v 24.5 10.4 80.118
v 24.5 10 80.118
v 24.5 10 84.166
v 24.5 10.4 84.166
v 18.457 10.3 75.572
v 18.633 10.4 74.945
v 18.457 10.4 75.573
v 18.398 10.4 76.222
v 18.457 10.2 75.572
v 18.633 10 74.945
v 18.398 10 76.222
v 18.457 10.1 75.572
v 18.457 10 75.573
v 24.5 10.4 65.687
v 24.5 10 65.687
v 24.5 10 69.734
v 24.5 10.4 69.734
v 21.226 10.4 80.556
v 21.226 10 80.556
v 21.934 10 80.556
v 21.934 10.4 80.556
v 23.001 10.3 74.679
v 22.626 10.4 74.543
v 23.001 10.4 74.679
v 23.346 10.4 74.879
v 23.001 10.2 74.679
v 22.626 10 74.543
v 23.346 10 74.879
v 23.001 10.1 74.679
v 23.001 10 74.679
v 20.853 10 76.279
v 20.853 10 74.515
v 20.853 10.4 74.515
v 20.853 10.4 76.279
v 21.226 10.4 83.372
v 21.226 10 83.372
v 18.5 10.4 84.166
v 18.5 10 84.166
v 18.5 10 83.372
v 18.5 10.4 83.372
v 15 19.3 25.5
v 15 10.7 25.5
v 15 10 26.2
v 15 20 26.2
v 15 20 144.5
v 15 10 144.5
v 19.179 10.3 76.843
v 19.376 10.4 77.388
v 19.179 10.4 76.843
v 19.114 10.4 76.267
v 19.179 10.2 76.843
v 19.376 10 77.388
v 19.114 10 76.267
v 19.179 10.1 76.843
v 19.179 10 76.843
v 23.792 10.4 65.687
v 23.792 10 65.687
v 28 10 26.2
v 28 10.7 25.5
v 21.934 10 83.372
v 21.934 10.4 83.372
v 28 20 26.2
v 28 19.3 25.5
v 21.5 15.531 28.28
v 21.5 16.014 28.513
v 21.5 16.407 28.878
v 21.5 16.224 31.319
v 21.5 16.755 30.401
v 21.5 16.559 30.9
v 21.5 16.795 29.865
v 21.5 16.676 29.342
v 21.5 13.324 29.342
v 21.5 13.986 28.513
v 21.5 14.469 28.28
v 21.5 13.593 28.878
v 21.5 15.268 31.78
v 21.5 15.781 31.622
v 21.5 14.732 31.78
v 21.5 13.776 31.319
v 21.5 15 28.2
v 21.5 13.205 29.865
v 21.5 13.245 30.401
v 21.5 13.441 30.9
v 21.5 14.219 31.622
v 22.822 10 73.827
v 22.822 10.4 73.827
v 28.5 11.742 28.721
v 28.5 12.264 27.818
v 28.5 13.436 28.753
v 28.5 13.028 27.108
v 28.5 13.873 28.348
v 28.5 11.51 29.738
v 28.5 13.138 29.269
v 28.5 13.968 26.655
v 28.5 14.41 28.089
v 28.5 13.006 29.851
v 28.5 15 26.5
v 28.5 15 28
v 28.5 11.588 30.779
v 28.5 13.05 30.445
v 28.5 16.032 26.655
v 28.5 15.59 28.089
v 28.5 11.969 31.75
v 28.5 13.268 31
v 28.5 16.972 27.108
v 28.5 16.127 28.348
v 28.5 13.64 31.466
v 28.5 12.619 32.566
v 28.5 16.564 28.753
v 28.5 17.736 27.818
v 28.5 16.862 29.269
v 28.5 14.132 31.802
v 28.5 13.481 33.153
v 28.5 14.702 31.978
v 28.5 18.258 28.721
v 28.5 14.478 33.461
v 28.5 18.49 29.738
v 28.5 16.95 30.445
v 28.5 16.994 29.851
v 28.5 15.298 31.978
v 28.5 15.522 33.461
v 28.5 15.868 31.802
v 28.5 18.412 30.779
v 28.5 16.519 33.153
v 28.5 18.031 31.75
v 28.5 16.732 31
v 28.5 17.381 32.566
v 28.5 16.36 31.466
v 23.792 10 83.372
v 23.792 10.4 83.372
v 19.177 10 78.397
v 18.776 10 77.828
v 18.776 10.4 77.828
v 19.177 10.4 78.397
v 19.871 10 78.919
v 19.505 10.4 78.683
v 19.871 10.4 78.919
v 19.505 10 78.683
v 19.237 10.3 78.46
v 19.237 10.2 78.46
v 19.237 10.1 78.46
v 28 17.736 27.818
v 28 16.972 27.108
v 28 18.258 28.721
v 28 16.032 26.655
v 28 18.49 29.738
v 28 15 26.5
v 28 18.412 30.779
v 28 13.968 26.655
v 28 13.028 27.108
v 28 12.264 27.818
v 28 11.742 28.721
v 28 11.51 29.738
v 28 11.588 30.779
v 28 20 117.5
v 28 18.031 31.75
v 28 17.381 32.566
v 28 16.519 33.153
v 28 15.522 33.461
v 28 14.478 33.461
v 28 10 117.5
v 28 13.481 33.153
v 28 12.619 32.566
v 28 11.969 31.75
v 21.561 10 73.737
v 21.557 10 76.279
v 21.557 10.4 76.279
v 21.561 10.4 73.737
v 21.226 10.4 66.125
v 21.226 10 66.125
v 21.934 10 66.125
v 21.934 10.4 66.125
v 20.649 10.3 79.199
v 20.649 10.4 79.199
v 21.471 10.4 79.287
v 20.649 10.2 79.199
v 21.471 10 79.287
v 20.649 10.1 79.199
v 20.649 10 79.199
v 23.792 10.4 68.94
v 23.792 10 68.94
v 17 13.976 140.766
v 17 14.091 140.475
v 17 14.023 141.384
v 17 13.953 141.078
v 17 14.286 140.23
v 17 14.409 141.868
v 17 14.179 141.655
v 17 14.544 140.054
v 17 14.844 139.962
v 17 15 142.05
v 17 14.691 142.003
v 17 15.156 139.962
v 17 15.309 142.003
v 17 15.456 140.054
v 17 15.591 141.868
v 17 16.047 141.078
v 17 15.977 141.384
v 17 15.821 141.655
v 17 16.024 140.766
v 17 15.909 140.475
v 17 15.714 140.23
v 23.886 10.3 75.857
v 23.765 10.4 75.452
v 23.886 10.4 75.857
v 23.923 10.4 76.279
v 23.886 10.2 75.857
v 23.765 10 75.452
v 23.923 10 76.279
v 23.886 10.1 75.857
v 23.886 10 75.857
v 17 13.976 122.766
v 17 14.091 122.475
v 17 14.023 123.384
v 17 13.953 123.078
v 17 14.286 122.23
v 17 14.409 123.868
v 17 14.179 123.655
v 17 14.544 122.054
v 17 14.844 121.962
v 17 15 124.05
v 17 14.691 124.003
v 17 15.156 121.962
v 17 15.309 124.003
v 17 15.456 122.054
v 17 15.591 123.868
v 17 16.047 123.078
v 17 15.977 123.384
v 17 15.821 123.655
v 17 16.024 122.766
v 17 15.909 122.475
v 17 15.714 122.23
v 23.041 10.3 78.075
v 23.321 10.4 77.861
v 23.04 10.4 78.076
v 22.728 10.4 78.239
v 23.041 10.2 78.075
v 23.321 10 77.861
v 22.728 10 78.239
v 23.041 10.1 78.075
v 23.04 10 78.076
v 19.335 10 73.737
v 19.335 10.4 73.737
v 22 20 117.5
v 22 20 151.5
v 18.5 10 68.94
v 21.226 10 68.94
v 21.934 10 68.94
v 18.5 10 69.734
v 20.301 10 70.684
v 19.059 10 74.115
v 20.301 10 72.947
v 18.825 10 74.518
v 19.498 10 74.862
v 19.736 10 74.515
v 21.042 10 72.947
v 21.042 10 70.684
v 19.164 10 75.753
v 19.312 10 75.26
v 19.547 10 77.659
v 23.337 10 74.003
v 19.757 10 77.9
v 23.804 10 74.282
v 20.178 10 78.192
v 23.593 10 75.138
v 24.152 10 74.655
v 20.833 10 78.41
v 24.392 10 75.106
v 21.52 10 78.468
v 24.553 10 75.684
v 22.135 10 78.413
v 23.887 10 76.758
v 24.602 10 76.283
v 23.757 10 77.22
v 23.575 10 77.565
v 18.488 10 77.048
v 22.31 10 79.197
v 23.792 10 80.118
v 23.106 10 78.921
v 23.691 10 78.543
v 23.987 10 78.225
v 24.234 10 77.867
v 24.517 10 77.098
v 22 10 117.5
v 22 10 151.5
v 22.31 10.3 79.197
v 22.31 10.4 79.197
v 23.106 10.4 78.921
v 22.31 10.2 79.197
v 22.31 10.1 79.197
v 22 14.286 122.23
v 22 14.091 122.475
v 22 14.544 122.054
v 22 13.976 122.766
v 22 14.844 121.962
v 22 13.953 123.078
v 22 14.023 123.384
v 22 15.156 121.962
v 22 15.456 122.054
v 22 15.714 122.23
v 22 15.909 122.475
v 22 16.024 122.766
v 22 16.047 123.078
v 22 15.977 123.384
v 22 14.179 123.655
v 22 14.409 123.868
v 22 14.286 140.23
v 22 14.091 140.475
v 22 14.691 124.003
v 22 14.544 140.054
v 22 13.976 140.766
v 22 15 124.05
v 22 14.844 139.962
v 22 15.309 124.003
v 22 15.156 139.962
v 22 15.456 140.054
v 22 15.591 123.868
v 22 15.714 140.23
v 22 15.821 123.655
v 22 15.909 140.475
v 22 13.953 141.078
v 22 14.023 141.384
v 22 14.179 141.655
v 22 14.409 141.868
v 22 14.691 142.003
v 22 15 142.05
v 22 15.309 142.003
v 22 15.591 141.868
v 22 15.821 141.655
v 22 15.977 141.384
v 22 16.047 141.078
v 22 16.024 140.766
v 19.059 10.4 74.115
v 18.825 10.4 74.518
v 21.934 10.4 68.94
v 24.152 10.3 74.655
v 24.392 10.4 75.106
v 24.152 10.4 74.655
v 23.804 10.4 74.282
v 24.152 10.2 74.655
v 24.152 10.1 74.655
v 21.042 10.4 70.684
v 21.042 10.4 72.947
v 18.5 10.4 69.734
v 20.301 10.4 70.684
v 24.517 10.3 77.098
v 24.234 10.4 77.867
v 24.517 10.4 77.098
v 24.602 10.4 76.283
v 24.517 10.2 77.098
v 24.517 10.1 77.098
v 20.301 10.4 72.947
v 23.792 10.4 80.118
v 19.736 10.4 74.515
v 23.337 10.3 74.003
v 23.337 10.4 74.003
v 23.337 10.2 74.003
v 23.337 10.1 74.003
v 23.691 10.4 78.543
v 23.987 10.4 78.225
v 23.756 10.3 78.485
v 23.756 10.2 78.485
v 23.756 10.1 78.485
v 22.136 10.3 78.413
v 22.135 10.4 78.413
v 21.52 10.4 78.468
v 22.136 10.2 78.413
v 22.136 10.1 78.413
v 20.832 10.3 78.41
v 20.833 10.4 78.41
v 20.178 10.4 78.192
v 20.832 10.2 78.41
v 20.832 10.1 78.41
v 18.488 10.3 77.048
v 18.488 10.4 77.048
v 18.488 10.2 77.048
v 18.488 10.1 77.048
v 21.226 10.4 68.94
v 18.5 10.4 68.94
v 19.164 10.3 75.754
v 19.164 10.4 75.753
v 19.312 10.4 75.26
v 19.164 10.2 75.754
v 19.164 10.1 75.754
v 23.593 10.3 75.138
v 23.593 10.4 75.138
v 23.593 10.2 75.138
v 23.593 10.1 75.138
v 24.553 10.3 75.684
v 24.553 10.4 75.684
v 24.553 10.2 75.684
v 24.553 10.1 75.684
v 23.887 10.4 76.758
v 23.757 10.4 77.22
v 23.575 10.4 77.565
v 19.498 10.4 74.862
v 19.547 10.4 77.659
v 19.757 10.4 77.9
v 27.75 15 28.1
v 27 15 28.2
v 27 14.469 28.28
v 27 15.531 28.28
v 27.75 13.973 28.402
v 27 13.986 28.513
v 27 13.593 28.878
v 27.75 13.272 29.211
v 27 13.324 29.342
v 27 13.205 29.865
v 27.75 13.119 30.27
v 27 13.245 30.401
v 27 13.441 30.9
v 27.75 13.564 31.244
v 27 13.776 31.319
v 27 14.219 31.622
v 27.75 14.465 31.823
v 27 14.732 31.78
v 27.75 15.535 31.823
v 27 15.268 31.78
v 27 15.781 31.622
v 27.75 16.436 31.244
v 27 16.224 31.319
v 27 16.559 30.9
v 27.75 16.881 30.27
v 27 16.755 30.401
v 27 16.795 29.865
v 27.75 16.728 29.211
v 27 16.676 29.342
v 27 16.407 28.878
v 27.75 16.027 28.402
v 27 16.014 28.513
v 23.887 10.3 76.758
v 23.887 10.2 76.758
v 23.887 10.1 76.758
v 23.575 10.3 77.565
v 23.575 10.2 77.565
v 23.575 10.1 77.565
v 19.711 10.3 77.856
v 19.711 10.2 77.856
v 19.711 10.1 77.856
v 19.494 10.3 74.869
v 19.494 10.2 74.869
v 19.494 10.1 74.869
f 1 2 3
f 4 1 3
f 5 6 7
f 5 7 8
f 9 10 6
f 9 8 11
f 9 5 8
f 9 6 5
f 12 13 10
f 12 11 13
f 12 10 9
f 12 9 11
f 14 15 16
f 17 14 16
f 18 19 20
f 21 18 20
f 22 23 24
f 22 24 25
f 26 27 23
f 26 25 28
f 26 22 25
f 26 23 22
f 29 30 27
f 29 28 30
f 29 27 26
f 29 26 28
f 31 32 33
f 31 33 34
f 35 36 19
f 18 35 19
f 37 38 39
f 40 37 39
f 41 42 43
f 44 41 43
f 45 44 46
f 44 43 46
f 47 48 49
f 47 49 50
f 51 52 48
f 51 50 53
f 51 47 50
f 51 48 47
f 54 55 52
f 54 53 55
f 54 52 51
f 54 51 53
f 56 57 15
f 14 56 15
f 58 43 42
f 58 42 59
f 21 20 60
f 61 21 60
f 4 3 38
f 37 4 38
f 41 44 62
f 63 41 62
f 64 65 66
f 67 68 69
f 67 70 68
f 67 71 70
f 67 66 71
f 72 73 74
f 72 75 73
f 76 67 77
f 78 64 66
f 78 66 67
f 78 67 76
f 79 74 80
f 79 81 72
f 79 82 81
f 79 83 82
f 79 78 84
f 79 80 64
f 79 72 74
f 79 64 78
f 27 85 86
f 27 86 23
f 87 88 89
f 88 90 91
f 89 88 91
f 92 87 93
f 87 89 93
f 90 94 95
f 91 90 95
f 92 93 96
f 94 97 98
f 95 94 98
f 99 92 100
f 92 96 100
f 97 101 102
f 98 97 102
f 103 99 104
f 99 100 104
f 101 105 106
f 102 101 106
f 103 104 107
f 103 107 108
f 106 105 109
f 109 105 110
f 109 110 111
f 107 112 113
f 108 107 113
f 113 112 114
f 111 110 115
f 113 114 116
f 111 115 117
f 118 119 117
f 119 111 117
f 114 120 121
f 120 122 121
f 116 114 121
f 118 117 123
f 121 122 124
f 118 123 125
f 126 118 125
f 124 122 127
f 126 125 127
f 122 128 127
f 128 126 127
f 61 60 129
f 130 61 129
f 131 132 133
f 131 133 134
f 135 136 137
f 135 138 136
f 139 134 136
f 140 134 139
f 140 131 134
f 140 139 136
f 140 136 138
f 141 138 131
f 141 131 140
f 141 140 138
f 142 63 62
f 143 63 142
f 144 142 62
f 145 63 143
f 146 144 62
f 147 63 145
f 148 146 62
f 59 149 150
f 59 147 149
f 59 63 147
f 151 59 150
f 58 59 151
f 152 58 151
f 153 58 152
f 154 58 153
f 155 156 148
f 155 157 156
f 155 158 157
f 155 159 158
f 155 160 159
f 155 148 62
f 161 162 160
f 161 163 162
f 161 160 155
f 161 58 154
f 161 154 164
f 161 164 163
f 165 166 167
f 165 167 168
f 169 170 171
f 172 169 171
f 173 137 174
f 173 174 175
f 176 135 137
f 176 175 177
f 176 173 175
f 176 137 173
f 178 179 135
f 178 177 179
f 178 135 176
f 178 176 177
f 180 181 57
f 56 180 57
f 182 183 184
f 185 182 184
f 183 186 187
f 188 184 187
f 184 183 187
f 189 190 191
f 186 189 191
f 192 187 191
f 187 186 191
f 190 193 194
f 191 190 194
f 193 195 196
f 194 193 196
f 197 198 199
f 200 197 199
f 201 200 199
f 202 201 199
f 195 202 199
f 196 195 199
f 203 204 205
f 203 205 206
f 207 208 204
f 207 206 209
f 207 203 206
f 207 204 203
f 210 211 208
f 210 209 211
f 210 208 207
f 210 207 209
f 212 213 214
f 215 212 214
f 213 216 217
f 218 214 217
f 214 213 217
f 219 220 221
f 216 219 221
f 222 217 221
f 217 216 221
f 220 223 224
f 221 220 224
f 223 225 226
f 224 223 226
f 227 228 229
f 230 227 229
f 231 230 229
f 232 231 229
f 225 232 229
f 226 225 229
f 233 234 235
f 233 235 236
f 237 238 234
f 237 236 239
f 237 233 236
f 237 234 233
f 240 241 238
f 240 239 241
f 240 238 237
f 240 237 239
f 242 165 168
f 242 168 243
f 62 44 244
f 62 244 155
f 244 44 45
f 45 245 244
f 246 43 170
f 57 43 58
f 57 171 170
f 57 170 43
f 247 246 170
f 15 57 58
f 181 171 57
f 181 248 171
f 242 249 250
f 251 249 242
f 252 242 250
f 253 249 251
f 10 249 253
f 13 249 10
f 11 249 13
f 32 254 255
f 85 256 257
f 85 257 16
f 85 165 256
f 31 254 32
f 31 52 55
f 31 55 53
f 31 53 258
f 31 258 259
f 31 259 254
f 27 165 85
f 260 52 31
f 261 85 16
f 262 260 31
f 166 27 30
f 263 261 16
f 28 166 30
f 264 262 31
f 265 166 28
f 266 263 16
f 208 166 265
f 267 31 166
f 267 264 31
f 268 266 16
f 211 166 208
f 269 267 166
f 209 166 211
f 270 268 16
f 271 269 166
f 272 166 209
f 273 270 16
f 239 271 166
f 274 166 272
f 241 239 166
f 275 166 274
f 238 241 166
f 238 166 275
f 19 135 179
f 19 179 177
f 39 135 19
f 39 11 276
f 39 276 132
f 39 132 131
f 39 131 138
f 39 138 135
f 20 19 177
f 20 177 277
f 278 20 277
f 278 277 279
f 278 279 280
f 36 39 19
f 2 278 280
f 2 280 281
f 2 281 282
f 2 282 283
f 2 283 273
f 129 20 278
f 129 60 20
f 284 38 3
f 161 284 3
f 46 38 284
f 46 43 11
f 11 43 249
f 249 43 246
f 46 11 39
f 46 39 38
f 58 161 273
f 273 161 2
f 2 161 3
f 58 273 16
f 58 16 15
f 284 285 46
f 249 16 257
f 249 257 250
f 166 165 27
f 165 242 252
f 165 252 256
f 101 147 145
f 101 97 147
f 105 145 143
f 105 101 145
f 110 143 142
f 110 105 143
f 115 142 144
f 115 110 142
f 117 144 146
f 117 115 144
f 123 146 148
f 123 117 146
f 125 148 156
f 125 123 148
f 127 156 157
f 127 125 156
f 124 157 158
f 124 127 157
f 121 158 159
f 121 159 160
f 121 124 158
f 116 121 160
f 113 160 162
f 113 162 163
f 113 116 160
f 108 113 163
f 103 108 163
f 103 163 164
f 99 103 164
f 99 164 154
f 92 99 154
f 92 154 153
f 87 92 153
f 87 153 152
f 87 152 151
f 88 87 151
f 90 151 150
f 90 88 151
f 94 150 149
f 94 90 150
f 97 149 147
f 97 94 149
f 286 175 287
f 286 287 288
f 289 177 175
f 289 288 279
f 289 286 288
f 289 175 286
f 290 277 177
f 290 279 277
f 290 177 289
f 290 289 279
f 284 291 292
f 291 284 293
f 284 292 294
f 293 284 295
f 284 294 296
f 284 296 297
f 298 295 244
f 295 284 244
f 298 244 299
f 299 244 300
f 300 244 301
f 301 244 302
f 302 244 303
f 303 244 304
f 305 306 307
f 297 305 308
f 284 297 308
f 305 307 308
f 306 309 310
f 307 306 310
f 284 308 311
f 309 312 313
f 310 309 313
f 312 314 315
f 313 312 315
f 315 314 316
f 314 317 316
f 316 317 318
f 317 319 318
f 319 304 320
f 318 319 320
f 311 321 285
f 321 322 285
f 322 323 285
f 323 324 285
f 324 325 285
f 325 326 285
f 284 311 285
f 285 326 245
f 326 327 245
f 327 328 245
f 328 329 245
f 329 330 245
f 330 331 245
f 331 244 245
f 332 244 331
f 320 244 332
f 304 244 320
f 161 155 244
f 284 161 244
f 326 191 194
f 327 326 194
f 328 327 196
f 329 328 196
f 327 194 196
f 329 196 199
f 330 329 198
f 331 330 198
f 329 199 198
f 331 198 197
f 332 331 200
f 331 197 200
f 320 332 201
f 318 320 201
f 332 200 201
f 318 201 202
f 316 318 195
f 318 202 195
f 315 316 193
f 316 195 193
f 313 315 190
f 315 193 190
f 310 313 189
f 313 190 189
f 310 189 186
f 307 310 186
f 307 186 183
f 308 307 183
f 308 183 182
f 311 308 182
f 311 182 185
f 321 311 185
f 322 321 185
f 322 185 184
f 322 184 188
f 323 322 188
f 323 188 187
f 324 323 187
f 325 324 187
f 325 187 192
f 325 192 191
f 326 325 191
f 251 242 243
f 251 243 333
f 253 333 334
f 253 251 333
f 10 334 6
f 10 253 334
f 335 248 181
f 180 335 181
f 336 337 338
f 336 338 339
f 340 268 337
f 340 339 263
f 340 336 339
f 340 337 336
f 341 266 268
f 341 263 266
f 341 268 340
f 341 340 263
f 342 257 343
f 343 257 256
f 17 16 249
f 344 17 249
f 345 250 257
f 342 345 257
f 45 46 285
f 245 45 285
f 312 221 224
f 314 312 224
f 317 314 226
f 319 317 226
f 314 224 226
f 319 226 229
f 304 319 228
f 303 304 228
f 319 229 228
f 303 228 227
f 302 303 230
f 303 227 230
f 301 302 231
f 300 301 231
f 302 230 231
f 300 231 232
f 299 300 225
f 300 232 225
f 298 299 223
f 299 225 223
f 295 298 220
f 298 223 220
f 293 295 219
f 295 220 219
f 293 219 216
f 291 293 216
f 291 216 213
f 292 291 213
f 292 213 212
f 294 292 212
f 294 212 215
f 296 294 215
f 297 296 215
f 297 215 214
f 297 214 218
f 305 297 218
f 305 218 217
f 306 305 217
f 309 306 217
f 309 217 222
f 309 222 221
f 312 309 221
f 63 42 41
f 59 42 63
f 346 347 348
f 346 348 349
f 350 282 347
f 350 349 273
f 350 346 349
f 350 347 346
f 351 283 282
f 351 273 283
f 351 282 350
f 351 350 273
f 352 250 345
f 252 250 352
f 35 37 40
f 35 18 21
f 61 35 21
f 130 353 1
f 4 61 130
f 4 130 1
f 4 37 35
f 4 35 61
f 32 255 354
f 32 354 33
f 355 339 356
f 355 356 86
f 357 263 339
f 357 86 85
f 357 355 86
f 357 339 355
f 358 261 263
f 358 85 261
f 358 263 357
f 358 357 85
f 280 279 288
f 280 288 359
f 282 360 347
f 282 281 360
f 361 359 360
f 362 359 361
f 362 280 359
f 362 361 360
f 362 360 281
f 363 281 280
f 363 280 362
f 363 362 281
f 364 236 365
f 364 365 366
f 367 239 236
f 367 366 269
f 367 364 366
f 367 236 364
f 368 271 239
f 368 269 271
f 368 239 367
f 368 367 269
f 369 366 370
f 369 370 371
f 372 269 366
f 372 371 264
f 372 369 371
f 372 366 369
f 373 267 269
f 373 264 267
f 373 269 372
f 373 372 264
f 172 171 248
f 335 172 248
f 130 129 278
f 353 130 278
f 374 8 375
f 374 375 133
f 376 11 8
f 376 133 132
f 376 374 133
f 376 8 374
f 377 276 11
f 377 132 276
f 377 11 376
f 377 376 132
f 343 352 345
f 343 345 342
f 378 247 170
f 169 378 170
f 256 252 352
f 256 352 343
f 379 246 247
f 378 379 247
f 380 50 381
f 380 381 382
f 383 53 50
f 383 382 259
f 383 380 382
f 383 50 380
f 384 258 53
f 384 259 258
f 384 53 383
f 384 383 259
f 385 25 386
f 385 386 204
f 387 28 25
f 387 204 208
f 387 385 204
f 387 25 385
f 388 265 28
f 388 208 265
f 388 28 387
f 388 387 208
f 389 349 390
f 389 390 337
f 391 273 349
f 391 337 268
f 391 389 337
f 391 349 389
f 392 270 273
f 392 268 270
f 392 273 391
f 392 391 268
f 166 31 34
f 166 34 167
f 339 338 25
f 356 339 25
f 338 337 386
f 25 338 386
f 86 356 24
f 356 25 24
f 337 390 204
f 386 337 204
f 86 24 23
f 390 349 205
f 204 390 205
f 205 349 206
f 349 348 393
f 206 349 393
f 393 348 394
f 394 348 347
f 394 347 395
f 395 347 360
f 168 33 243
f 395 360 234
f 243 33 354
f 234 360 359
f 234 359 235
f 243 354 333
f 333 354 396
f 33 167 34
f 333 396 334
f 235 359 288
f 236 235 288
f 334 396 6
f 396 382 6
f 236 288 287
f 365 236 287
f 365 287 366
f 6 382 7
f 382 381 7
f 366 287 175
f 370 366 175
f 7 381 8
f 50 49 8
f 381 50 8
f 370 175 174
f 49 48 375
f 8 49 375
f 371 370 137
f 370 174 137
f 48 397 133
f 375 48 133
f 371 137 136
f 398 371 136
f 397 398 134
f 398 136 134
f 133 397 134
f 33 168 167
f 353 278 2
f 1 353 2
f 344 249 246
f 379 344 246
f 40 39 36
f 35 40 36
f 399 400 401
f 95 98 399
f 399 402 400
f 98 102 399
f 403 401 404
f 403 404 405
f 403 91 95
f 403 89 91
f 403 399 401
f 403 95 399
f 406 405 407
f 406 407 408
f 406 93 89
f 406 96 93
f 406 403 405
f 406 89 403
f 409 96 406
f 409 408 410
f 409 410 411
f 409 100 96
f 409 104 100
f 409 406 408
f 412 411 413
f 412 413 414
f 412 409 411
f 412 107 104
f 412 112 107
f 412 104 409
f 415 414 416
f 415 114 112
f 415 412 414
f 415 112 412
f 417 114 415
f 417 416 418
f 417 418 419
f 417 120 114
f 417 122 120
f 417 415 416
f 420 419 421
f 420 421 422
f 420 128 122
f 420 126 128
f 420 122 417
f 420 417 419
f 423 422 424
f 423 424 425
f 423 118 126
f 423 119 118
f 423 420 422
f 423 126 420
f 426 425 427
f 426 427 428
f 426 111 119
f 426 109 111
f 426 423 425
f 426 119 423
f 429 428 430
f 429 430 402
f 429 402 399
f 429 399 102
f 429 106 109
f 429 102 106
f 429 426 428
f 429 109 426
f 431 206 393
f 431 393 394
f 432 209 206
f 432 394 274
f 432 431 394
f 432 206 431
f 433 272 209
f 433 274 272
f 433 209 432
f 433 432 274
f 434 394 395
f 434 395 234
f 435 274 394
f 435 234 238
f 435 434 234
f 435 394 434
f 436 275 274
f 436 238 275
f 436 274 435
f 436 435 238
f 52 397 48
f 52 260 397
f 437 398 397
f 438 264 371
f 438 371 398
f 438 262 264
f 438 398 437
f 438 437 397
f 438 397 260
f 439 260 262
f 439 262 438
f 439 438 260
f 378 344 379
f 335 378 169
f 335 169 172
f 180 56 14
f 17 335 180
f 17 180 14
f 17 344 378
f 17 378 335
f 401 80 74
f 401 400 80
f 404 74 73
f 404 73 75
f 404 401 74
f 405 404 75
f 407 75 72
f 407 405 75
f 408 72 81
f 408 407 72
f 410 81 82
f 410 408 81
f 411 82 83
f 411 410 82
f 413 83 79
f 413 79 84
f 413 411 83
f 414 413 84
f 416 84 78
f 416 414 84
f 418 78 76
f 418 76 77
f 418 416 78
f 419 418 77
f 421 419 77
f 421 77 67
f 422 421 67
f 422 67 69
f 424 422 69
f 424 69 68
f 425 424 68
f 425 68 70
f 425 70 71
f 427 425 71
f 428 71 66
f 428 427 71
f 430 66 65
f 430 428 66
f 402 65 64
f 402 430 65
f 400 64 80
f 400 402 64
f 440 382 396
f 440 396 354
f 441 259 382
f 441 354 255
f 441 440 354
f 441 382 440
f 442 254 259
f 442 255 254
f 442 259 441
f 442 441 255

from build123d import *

# Parameters (mm, degrees)
ESQUISSE1_W                         = 13
ESQUISSE1_H                         = 126
BOSS_EXTRU_1_DEPTH                  = 10
ESQUISSE2_W                         = 6
ESQUISSE2_H                         = 34
ENL_V_MAT_EXTRU_1_DEPTH             = 155.389928428
ENL_V_START                         = 1.2
ENL_V_MAT_EXTRU_2_DEPTH             = 0.4
ENL_V_MAT_EXTRU_3_DEPTH             = 0.4
ENL_V_MAT_EXTRU_4_DEPTH             = 0.4
ESQUISSE6_W                         = 0.740791559
ESQUISSE6_H                         = 2.263300419
ENL_V_MAT_EXTRU_5_DEPTH             = 0.4
D_POUILLE1_ANGLE                    = -0.092269995
D_POUILLE2_ANGLE                    = 0.092269995
D_POUILLE3_ANGLE                    = -45
ESQUISSE7_W                         = 0.5
ESQUISSE7_H                         = 3.5
DIAM_TRE_DU_PER_AGE_2_1_2_1_1_D     = 2.1
DIAM_TRE_DU_PER_AGE_2_1_2_1_1_DEPTH = 5
CHANFREIN1_SIZE                     = 0.7


with BuildPart() as part:
    # Esquisse1 → Boss.-Extru.1 (new body)
    with BuildSketch(Plane.XZ.offset(-10)):
        with Locations((21.5, 88.5)):
            Rectangle(ESQUISSE1_W, ESQUISSE1_H)
    extrude(amount=-BOSS_EXTRU_1_DEPTH)

    # Esquisse2 → Enlèv. mat.-Extru.1 (cut, through all)
    with BuildSketch(Plane(origin=(0, 20, 0), x_dir=(-1, 0, 0), z_dir=(0, 1, 0))):
        with Locations((-25, 134.5)):
            Rectangle(ESQUISSE2_W, ESQUISSE2_H)
    extrude(amount=-ENL_V_MAT_EXTRU_1_DEPTH, mode=Mode.SUBTRACT)

    # Esquisse3 → Enlèv. mat.-Extru.2 (cut)
    with BuildSketch(Plane.XZ.offset(-11.2).offset(ENL_V_START)):
        with BuildLine():
            Line((20.853342891, 76.277673701), (21.557298779, 76.278807363))
            Line((21.557298779, 76.278807363), (21.56139183, 73.73719736))
            Line((21.56139183, 73.73719736), (19.337604377, 73.733616136))
            ThreePointArc((19.337604377, 73.733616136), (18.937851016, 74.311477162), (18.633015037, 74.944565734))
            add(Edge.make_bspline(
                [(18.633015037, 74.944565734), (18.598877989, 75.048134715), (18.530815128, 75.254631808), (18.449647927, 75.570941889), (18.41259048, 75.895390829), (18.402660702, 76.11257772), (18.397680402, 76.221508226)],
                knots=[0, 0, 0, 0, 0.250783, 0.500014197, 0.749231153, 1, 1, 1, 1], degree=3))
            add(Edge.make_bspline(
                [(18.397680402, 76.221508226), (18.404707316, 76.360829639), (18.418683348, 76.637930028), (18.475840729, 77.051065085), (18.608033081, 77.446634686), (18.719977562, 77.700354542), (18.776261687, 77.827921352)],
                knots=[0, 0, 0, 0, 0.251459099, 0.500134278, 0.748674478, 1, 1, 1, 1], degree=3))
            add(Edge.make_bspline(
                [(18.776261687, 77.827921352), (18.845594133, 77.939975948), (18.983004533, 78.16205764), (19.226428261, 78.470943979), (19.536080689, 78.713393436), (19.758734474, 78.849811508), (19.871078014, 78.918643436)],
                knots=[0, 0, 0, 0, 0.252300142, 0.500035199, 0.747734736, 1, 1, 1, 1], degree=3))
            add(Edge.make_bspline(
                [(19.871078014, 78.918643436), (19.998387452, 78.973593805), (20.251642055, 79.082905685), (20.645993091, 79.211619983), (21.057113166, 79.266914711), (21.332777469, 79.280276264), (21.471351266, 79.286992988)],
                knots=[0, 0, 0, 0, 0.251271452, 0.499850228, 0.748579513, 1, 1, 1, 1], degree=3))
            add(Edge.make_bspline(
                [(21.471351266, 79.286992988), (21.61250902, 79.279773241), (21.893469007, 79.265403078), (22.312514038, 79.209031831), (22.7157204, 79.081743941), (22.975763595, 78.974547289), (23.106412768, 78.920690259)],
                knots=[0, 0, 0, 0, 0.251233762, 0.500054957, 0.748820933, 1, 1, 1, 1], degree=3))
            add(Edge.make_bspline(
                [(23.106412768, 78.920690259), (23.221187424, 78.855887896), (23.448551437, 78.727517), (23.766911077, 78.49685491), (24.019672726, 78.19573618), (24.162080848, 77.977148745), (24.233970523, 77.866802654)],
                knots=[0, 0, 0, 0, 0.252519074, 0.500230209, 0.747708999, 1, 1, 1, 1], degree=3))
            add(Edge.make_bspline(
                [(24.233970523, 77.866802654), (24.289601824, 77.74114466), (24.400227282, 77.491267832), (24.529493504, 77.101027909), (24.583614751, 76.693519205), (24.596060717, 76.420296572), (24.602319479, 76.282899818)],
                knots=[0, 0, 0, 0, 0.251319556, 0.499760752, 0.748442329, 1, 1, 1, 1], degree=3))
            add(Edge.make_bspline(
                [(24.602319479, 76.282899818), (24.598711263, 76.182464999), (24.591519454, 75.982280772), (24.56051168, 75.683056166), (24.48684006, 75.391387004), (24.423380488, 75.201497819), (24.391541958, 75.106227836)],
                knots=[0, 0, 0, 0, 0.250925915, 0.500139405, 0.749213149, 1, 1, 1, 1], degree=3))
            add(Edge.make_bspline(
                [(24.391541958, 75.106227836), (24.356062424, 75.028126494), (24.285554136, 74.87291611), (24.15898731, 74.650089551), (23.991023414, 74.45654053), (23.86675947, 74.34011923), (23.804229379, 74.281535587)],
                knots=[0, 0, 0, 0, 0.25175747, 0.500316288, 0.748557245, 1, 1, 1, 1], degree=3))
            add(Edge.make_bspline(
                [(23.804229379, 74.281535587), (23.728753924, 74.230590324), (23.578415746, 74.129113387), (23.340086032, 73.996604052), (23.084028963, 73.902840483), (22.909556406, 73.852507456), (22.821965098, 73.827238521)],
                knots=[0, 0, 0, 0, 0.250860638, 0.499684722, 0.748824286, 1, 1, 1, 1], degree=3))
            Line((22.821965098, 73.827238521), (22.625511765, 74.543474159))
            add(Edge.make_bspline(
                [(22.625511765, 74.543474159), (22.689177507, 74.563582686), (22.816125851, 74.603678729), (23.002808274, 74.674933967), (23.178371642, 74.770364118), (23.289904539, 74.84276967), (23.345839262, 74.879081687)],
                knots=[0, 0, 0, 0, 0.250917255, 0.500324495, 0.749408362, 1, 1, 1, 1], degree=3))
            add(Edge.make_bspline(
                [(23.345839262, 74.879081687), (23.390203046, 74.919598808), (23.478372835, 75.000123634), (23.597726044, 75.134487648), (23.688549595, 75.289563684), (23.73964112, 75.397672698), (23.765348077, 75.45206829)],
                knots=[0, 0, 0, 0, 0.251387332, 0.499614011, 0.748228283, 1, 1, 1, 1], degree=3))
            add(Edge.make_bspline(
                [(23.765348077, 75.45206829), (23.789008491, 75.518784077), (23.836150518, 75.651711479), (23.891167257, 75.856395572), (23.914580183, 76.067045865), (23.920133119, 76.208042107), (23.922920108, 76.278807363)],
                knots=[0, 0, 0, 0, 0.250882944, 0.49986997, 0.748987428, 1, 1, 1, 1], degree=3))
            add(Edge.make_bspline(
                [(23.922920108, 76.278807363), (23.920511452, 76.359188387), (23.915711583, 76.519368292), (23.89240824, 76.758868036), (23.834062357, 76.992322036), (23.782857942, 77.144019816), (23.757162571, 77.22014471)],
                knots=[0, 0, 0, 0, 0.251034583, 0.500251096, 0.74921629, 1, 1, 1, 1], degree=3))
            add(Edge.make_bspline(
                [(23.757162571, 77.22014471), (23.729672868, 77.279418984), (23.674945132, 77.397424872), (23.579353438, 77.56786432), (23.456707319, 77.720003547), (23.366562662, 77.813633023), (23.321282744, 77.860663375)],
                knots=[0, 0, 0, 0, 0.25126472, 0.500229098, 0.748963655, 1, 1, 1, 1], degree=3))
            add(Edge.make_bspline(
                [(23.321282744, 77.860663375), (23.275908475, 77.898471307), (23.185404712, 77.973883213), (23.042714988, 78.078444046), (22.887828988, 78.163906132), (22.781260082, 78.214085774), (22.727831483, 78.239243469)],
                knots=[0, 0, 0, 0, 0.250690915, 0.500029454, 0.749338462, 1, 1, 1, 1], degree=3))
            add(Edge.make_bspline(
                [(22.727831483, 78.239243469), (22.630282244, 78.273310635), (22.435887582, 78.341199173), (22.136961191, 78.420956742), (21.82952565, 78.455607579), (21.623732954, 78.464151438), (21.520464301, 78.468438825)],
                knots=[0, 0, 0, 0, 0.250863433, 0.499916891, 0.749053732, 1, 1, 1, 1], degree=3))
            add(Edge.make_bspline(
                [(21.520464301, 78.468438825), (21.404727069, 78.464782543), (21.17444342, 78.457507597), (20.830459066, 78.41956085), (20.498481034, 78.321775426), (20.285218981, 78.235525632), (20.178035378, 78.192177257)],
                knots=[0, 0, 0, 0, 0.251508131, 0.500428504, 0.748919829, 1, 1, 1, 1], degree=3))
            add(Edge.make_bspline(
                [(20.178035378, 78.192177257), (20.095012391, 78.141920052), (19.930593774, 78.042390751), (19.702109128, 77.864604869), (19.524573648, 77.635924233), (19.425752299, 77.47115107), (19.375852227, 77.387948474)],
                knots=[0, 0, 0, 0, 0.252519428, 0.500089146, 0.747568839, 1, 1, 1, 1], degree=3))
            add(Edge.make_bspline(
                [(19.375852227, 77.387948474), (19.337663327, 77.298574803), (19.261671031, 77.120729659), (19.170871606, 76.844534828), (19.129994348, 76.556685787), (19.119293569, 76.36357432), (19.113916039, 76.266528806)],
                knots=[0, 0, 0, 0, 0.251262992, 0.499989565, 0.748726625, 1, 1, 1, 1], degree=3))
            add(Edge.make_bspline(
                [(19.113916039, 76.266528806), (19.118173223, 76.18036823), (19.126657842, 76.008649142), (19.158071405, 75.752276351), (19.226503664, 75.503216877), (19.283711047, 75.341066696), (19.312415004, 75.259707412)],
                knots=[0, 0, 0, 0, 0.250862607, 0.499972264, 0.749109753, 1, 1, 1, 1], degree=3))
            add(Edge.make_bspline(
                [(19.312415004, 75.259707412), (19.340302347, 75.193424583), (19.3959353, 75.061195796), (19.489793739, 74.867464161), (19.606433607, 74.686525861), (19.692748901, 74.572154479), (19.736016273, 74.514823398)],
                knots=[0, 0, 0, 0, 0.250800542, 0.500326436, 0.749528026, 1, 1, 1, 1], degree=3))
            Line((19.736016273, 74.514823398), (20.853342891, 74.514823398))
            Line((20.853342891, 74.514823398), (20.853342891, 76.277673701))
        make_face()
    extrude(amount=-ENL_V_MAT_EXTRU_2_DEPTH, mode=Mode.SUBTRACT)

    # Esquisse4 → Enlèv. mat.-Extru.3 (cut)
    with BuildSketch(Plane.XZ.offset(-10)):
        Polygon((24.500000358, 84.16557475), (18.500000119, 84.16557475), (18.500000119, 83.371577701), (21.225784898, 83.371577701), (21.225784898, 80.555751762), (21.933833838, 80.555751762), (21.933833838, 83.371577701), (23.791950822, 83.371577701), (23.791950822, 80.117825708), (24.500000358, 80.117825708), align=None)
    extrude(amount=-ENL_V_MAT_EXTRU_3_DEPTH, mode=Mode.SUBTRACT)

    # Esquisse5 → Enlèv. mat.-Extru.4 (cut)
    with BuildSketch(Plane.XZ.offset(-10)):
        Polygon((24.500000358, 69.734468898), (18.500000119, 69.734468898), (18.500000119, 68.940470657), (21.225784898, 68.940470657), (21.225784898, 66.124647102), (21.933833838, 66.124647102), (21.933833838, 68.940470657), (23.791950822, 68.940470657), (23.791950822, 65.686719856), (24.500000358, 65.686719856), align=None)
    extrude(amount=-ENL_V_MAT_EXTRU_4_DEPTH, mode=Mode.SUBTRACT)

    # Esquisse6 → Enlèv. mat.-Extru.5 (cut)
    with BuildSketch(Plane.XZ.offset(-10)):
        with Locations((20.671214343, 71.815642556)):
            Rectangle(ESQUISSE6_W, ESQUISSE6_H)
    extrude(amount=-ENL_V_MAT_EXTRU_5_DEPTH, mode=Mode.SUBTRACT)

    # Dépouille1
    d_pouille1_faces = [part.faces().sort_by_distance(p)[0] for p in [
        (20.449498104, 10.2, 73.735406748),
    ]]
    draft(d_pouille1_faces, Plane(origin=(21.680083212, 10.4, 0.034913966), x_dir=(0.0016104145188022617, 0, -0.9999987032816982), z_dir=(-0.9999987032816982, 0, -0.0016104145188022617)), D_POUILLE1_ANGLE)

    # Dépouille2
    d_pouille2_faces = [part.faces().sort_by_distance(p)[0] for p in [
        (21.205320835, 10.2, 76.278240532),
    ]]
    draft(d_pouille2_faces, Plane(origin=(21.680083212, 10.4, 0.034913966), x_dir=(0.0016104145188022617, 0, -0.9999987032816982), z_dir=(-0.9999987032816982, 0, -0.0016104145188022617)), D_POUILLE2_ANGLE)

    # Dépouille3
    d_pouille3_faces = [part.faces().sort_by_distance(p)[0] for p in [
        (18.5, 15, 151.5),
    ]]
    draft(d_pouille3_faces, Plane(origin=(22, 10, 117.5), x_dir=(0, 0, 1), z_dir=(1, 0, 0)), D_POUILLE3_ANGLE)

    # Esquisse7 → Révolution1 (revolve)
    with BuildSketch(Plane.XY.offset(30.000000447), mode=Mode.PRIVATE) as r_volution1_sk:
        with Locations((28.25, 16.750000224)):
            Rectangle(ESQUISSE7_W, ESQUISSE7_H)
    revolve(r_volution1_sk.sketch.rotate(Axis((28, 15.000000224, 30.000000447), (1, 0, 0)), 270), axis=Axis((28, 15.000000224, 30.000000447), (1, 0, 0)))

    # Esquisse8 → Fraisage pour vis à tête fraisée M31 (revolve, cut)
    with BuildSketch(Plane(origin=(28.5, 15.000000224, 30.000000447), x_dir=(0, 0, -1), z_dir=(0, 1, 0))):
        Polygon((0, 0), (0, 7), (1.8, 7), (1.8, 1.5), (2, 0), align=None)
    revolve(axis=Axis((34.85, 15.000000224, 30.000000447), (-1, 0, 0)), mode=Mode.SUBTRACT)

    # Diamètre du perçage Ø2.1 (2.1)1
    with Locations(Plane(origin=(22, 0, 0), x_dir=(0, 0, -1), z_dir=(1, 0, 0))):
        with Locations((-141.000001952, 15.000000224), (-123.000001684, 15.000000224)):
            Hole(DIAM_TRE_DU_PER_AGE_2_1_2_1_1_D / 2, depth=DIAM_TRE_DU_PER_AGE_2_1_2_1_1_DEPTH)

    # Chanfrein1
    chanfrein1_edges = [part.edges().sort_by_distance(p)[0] for p in [
        (21.5, 20, 25.5),
        (21.5, 10, 25.5),
    ]]
    chamfer(chanfrein1_edges, length=CHANFREIN1_SIZE)


solid = part.part
